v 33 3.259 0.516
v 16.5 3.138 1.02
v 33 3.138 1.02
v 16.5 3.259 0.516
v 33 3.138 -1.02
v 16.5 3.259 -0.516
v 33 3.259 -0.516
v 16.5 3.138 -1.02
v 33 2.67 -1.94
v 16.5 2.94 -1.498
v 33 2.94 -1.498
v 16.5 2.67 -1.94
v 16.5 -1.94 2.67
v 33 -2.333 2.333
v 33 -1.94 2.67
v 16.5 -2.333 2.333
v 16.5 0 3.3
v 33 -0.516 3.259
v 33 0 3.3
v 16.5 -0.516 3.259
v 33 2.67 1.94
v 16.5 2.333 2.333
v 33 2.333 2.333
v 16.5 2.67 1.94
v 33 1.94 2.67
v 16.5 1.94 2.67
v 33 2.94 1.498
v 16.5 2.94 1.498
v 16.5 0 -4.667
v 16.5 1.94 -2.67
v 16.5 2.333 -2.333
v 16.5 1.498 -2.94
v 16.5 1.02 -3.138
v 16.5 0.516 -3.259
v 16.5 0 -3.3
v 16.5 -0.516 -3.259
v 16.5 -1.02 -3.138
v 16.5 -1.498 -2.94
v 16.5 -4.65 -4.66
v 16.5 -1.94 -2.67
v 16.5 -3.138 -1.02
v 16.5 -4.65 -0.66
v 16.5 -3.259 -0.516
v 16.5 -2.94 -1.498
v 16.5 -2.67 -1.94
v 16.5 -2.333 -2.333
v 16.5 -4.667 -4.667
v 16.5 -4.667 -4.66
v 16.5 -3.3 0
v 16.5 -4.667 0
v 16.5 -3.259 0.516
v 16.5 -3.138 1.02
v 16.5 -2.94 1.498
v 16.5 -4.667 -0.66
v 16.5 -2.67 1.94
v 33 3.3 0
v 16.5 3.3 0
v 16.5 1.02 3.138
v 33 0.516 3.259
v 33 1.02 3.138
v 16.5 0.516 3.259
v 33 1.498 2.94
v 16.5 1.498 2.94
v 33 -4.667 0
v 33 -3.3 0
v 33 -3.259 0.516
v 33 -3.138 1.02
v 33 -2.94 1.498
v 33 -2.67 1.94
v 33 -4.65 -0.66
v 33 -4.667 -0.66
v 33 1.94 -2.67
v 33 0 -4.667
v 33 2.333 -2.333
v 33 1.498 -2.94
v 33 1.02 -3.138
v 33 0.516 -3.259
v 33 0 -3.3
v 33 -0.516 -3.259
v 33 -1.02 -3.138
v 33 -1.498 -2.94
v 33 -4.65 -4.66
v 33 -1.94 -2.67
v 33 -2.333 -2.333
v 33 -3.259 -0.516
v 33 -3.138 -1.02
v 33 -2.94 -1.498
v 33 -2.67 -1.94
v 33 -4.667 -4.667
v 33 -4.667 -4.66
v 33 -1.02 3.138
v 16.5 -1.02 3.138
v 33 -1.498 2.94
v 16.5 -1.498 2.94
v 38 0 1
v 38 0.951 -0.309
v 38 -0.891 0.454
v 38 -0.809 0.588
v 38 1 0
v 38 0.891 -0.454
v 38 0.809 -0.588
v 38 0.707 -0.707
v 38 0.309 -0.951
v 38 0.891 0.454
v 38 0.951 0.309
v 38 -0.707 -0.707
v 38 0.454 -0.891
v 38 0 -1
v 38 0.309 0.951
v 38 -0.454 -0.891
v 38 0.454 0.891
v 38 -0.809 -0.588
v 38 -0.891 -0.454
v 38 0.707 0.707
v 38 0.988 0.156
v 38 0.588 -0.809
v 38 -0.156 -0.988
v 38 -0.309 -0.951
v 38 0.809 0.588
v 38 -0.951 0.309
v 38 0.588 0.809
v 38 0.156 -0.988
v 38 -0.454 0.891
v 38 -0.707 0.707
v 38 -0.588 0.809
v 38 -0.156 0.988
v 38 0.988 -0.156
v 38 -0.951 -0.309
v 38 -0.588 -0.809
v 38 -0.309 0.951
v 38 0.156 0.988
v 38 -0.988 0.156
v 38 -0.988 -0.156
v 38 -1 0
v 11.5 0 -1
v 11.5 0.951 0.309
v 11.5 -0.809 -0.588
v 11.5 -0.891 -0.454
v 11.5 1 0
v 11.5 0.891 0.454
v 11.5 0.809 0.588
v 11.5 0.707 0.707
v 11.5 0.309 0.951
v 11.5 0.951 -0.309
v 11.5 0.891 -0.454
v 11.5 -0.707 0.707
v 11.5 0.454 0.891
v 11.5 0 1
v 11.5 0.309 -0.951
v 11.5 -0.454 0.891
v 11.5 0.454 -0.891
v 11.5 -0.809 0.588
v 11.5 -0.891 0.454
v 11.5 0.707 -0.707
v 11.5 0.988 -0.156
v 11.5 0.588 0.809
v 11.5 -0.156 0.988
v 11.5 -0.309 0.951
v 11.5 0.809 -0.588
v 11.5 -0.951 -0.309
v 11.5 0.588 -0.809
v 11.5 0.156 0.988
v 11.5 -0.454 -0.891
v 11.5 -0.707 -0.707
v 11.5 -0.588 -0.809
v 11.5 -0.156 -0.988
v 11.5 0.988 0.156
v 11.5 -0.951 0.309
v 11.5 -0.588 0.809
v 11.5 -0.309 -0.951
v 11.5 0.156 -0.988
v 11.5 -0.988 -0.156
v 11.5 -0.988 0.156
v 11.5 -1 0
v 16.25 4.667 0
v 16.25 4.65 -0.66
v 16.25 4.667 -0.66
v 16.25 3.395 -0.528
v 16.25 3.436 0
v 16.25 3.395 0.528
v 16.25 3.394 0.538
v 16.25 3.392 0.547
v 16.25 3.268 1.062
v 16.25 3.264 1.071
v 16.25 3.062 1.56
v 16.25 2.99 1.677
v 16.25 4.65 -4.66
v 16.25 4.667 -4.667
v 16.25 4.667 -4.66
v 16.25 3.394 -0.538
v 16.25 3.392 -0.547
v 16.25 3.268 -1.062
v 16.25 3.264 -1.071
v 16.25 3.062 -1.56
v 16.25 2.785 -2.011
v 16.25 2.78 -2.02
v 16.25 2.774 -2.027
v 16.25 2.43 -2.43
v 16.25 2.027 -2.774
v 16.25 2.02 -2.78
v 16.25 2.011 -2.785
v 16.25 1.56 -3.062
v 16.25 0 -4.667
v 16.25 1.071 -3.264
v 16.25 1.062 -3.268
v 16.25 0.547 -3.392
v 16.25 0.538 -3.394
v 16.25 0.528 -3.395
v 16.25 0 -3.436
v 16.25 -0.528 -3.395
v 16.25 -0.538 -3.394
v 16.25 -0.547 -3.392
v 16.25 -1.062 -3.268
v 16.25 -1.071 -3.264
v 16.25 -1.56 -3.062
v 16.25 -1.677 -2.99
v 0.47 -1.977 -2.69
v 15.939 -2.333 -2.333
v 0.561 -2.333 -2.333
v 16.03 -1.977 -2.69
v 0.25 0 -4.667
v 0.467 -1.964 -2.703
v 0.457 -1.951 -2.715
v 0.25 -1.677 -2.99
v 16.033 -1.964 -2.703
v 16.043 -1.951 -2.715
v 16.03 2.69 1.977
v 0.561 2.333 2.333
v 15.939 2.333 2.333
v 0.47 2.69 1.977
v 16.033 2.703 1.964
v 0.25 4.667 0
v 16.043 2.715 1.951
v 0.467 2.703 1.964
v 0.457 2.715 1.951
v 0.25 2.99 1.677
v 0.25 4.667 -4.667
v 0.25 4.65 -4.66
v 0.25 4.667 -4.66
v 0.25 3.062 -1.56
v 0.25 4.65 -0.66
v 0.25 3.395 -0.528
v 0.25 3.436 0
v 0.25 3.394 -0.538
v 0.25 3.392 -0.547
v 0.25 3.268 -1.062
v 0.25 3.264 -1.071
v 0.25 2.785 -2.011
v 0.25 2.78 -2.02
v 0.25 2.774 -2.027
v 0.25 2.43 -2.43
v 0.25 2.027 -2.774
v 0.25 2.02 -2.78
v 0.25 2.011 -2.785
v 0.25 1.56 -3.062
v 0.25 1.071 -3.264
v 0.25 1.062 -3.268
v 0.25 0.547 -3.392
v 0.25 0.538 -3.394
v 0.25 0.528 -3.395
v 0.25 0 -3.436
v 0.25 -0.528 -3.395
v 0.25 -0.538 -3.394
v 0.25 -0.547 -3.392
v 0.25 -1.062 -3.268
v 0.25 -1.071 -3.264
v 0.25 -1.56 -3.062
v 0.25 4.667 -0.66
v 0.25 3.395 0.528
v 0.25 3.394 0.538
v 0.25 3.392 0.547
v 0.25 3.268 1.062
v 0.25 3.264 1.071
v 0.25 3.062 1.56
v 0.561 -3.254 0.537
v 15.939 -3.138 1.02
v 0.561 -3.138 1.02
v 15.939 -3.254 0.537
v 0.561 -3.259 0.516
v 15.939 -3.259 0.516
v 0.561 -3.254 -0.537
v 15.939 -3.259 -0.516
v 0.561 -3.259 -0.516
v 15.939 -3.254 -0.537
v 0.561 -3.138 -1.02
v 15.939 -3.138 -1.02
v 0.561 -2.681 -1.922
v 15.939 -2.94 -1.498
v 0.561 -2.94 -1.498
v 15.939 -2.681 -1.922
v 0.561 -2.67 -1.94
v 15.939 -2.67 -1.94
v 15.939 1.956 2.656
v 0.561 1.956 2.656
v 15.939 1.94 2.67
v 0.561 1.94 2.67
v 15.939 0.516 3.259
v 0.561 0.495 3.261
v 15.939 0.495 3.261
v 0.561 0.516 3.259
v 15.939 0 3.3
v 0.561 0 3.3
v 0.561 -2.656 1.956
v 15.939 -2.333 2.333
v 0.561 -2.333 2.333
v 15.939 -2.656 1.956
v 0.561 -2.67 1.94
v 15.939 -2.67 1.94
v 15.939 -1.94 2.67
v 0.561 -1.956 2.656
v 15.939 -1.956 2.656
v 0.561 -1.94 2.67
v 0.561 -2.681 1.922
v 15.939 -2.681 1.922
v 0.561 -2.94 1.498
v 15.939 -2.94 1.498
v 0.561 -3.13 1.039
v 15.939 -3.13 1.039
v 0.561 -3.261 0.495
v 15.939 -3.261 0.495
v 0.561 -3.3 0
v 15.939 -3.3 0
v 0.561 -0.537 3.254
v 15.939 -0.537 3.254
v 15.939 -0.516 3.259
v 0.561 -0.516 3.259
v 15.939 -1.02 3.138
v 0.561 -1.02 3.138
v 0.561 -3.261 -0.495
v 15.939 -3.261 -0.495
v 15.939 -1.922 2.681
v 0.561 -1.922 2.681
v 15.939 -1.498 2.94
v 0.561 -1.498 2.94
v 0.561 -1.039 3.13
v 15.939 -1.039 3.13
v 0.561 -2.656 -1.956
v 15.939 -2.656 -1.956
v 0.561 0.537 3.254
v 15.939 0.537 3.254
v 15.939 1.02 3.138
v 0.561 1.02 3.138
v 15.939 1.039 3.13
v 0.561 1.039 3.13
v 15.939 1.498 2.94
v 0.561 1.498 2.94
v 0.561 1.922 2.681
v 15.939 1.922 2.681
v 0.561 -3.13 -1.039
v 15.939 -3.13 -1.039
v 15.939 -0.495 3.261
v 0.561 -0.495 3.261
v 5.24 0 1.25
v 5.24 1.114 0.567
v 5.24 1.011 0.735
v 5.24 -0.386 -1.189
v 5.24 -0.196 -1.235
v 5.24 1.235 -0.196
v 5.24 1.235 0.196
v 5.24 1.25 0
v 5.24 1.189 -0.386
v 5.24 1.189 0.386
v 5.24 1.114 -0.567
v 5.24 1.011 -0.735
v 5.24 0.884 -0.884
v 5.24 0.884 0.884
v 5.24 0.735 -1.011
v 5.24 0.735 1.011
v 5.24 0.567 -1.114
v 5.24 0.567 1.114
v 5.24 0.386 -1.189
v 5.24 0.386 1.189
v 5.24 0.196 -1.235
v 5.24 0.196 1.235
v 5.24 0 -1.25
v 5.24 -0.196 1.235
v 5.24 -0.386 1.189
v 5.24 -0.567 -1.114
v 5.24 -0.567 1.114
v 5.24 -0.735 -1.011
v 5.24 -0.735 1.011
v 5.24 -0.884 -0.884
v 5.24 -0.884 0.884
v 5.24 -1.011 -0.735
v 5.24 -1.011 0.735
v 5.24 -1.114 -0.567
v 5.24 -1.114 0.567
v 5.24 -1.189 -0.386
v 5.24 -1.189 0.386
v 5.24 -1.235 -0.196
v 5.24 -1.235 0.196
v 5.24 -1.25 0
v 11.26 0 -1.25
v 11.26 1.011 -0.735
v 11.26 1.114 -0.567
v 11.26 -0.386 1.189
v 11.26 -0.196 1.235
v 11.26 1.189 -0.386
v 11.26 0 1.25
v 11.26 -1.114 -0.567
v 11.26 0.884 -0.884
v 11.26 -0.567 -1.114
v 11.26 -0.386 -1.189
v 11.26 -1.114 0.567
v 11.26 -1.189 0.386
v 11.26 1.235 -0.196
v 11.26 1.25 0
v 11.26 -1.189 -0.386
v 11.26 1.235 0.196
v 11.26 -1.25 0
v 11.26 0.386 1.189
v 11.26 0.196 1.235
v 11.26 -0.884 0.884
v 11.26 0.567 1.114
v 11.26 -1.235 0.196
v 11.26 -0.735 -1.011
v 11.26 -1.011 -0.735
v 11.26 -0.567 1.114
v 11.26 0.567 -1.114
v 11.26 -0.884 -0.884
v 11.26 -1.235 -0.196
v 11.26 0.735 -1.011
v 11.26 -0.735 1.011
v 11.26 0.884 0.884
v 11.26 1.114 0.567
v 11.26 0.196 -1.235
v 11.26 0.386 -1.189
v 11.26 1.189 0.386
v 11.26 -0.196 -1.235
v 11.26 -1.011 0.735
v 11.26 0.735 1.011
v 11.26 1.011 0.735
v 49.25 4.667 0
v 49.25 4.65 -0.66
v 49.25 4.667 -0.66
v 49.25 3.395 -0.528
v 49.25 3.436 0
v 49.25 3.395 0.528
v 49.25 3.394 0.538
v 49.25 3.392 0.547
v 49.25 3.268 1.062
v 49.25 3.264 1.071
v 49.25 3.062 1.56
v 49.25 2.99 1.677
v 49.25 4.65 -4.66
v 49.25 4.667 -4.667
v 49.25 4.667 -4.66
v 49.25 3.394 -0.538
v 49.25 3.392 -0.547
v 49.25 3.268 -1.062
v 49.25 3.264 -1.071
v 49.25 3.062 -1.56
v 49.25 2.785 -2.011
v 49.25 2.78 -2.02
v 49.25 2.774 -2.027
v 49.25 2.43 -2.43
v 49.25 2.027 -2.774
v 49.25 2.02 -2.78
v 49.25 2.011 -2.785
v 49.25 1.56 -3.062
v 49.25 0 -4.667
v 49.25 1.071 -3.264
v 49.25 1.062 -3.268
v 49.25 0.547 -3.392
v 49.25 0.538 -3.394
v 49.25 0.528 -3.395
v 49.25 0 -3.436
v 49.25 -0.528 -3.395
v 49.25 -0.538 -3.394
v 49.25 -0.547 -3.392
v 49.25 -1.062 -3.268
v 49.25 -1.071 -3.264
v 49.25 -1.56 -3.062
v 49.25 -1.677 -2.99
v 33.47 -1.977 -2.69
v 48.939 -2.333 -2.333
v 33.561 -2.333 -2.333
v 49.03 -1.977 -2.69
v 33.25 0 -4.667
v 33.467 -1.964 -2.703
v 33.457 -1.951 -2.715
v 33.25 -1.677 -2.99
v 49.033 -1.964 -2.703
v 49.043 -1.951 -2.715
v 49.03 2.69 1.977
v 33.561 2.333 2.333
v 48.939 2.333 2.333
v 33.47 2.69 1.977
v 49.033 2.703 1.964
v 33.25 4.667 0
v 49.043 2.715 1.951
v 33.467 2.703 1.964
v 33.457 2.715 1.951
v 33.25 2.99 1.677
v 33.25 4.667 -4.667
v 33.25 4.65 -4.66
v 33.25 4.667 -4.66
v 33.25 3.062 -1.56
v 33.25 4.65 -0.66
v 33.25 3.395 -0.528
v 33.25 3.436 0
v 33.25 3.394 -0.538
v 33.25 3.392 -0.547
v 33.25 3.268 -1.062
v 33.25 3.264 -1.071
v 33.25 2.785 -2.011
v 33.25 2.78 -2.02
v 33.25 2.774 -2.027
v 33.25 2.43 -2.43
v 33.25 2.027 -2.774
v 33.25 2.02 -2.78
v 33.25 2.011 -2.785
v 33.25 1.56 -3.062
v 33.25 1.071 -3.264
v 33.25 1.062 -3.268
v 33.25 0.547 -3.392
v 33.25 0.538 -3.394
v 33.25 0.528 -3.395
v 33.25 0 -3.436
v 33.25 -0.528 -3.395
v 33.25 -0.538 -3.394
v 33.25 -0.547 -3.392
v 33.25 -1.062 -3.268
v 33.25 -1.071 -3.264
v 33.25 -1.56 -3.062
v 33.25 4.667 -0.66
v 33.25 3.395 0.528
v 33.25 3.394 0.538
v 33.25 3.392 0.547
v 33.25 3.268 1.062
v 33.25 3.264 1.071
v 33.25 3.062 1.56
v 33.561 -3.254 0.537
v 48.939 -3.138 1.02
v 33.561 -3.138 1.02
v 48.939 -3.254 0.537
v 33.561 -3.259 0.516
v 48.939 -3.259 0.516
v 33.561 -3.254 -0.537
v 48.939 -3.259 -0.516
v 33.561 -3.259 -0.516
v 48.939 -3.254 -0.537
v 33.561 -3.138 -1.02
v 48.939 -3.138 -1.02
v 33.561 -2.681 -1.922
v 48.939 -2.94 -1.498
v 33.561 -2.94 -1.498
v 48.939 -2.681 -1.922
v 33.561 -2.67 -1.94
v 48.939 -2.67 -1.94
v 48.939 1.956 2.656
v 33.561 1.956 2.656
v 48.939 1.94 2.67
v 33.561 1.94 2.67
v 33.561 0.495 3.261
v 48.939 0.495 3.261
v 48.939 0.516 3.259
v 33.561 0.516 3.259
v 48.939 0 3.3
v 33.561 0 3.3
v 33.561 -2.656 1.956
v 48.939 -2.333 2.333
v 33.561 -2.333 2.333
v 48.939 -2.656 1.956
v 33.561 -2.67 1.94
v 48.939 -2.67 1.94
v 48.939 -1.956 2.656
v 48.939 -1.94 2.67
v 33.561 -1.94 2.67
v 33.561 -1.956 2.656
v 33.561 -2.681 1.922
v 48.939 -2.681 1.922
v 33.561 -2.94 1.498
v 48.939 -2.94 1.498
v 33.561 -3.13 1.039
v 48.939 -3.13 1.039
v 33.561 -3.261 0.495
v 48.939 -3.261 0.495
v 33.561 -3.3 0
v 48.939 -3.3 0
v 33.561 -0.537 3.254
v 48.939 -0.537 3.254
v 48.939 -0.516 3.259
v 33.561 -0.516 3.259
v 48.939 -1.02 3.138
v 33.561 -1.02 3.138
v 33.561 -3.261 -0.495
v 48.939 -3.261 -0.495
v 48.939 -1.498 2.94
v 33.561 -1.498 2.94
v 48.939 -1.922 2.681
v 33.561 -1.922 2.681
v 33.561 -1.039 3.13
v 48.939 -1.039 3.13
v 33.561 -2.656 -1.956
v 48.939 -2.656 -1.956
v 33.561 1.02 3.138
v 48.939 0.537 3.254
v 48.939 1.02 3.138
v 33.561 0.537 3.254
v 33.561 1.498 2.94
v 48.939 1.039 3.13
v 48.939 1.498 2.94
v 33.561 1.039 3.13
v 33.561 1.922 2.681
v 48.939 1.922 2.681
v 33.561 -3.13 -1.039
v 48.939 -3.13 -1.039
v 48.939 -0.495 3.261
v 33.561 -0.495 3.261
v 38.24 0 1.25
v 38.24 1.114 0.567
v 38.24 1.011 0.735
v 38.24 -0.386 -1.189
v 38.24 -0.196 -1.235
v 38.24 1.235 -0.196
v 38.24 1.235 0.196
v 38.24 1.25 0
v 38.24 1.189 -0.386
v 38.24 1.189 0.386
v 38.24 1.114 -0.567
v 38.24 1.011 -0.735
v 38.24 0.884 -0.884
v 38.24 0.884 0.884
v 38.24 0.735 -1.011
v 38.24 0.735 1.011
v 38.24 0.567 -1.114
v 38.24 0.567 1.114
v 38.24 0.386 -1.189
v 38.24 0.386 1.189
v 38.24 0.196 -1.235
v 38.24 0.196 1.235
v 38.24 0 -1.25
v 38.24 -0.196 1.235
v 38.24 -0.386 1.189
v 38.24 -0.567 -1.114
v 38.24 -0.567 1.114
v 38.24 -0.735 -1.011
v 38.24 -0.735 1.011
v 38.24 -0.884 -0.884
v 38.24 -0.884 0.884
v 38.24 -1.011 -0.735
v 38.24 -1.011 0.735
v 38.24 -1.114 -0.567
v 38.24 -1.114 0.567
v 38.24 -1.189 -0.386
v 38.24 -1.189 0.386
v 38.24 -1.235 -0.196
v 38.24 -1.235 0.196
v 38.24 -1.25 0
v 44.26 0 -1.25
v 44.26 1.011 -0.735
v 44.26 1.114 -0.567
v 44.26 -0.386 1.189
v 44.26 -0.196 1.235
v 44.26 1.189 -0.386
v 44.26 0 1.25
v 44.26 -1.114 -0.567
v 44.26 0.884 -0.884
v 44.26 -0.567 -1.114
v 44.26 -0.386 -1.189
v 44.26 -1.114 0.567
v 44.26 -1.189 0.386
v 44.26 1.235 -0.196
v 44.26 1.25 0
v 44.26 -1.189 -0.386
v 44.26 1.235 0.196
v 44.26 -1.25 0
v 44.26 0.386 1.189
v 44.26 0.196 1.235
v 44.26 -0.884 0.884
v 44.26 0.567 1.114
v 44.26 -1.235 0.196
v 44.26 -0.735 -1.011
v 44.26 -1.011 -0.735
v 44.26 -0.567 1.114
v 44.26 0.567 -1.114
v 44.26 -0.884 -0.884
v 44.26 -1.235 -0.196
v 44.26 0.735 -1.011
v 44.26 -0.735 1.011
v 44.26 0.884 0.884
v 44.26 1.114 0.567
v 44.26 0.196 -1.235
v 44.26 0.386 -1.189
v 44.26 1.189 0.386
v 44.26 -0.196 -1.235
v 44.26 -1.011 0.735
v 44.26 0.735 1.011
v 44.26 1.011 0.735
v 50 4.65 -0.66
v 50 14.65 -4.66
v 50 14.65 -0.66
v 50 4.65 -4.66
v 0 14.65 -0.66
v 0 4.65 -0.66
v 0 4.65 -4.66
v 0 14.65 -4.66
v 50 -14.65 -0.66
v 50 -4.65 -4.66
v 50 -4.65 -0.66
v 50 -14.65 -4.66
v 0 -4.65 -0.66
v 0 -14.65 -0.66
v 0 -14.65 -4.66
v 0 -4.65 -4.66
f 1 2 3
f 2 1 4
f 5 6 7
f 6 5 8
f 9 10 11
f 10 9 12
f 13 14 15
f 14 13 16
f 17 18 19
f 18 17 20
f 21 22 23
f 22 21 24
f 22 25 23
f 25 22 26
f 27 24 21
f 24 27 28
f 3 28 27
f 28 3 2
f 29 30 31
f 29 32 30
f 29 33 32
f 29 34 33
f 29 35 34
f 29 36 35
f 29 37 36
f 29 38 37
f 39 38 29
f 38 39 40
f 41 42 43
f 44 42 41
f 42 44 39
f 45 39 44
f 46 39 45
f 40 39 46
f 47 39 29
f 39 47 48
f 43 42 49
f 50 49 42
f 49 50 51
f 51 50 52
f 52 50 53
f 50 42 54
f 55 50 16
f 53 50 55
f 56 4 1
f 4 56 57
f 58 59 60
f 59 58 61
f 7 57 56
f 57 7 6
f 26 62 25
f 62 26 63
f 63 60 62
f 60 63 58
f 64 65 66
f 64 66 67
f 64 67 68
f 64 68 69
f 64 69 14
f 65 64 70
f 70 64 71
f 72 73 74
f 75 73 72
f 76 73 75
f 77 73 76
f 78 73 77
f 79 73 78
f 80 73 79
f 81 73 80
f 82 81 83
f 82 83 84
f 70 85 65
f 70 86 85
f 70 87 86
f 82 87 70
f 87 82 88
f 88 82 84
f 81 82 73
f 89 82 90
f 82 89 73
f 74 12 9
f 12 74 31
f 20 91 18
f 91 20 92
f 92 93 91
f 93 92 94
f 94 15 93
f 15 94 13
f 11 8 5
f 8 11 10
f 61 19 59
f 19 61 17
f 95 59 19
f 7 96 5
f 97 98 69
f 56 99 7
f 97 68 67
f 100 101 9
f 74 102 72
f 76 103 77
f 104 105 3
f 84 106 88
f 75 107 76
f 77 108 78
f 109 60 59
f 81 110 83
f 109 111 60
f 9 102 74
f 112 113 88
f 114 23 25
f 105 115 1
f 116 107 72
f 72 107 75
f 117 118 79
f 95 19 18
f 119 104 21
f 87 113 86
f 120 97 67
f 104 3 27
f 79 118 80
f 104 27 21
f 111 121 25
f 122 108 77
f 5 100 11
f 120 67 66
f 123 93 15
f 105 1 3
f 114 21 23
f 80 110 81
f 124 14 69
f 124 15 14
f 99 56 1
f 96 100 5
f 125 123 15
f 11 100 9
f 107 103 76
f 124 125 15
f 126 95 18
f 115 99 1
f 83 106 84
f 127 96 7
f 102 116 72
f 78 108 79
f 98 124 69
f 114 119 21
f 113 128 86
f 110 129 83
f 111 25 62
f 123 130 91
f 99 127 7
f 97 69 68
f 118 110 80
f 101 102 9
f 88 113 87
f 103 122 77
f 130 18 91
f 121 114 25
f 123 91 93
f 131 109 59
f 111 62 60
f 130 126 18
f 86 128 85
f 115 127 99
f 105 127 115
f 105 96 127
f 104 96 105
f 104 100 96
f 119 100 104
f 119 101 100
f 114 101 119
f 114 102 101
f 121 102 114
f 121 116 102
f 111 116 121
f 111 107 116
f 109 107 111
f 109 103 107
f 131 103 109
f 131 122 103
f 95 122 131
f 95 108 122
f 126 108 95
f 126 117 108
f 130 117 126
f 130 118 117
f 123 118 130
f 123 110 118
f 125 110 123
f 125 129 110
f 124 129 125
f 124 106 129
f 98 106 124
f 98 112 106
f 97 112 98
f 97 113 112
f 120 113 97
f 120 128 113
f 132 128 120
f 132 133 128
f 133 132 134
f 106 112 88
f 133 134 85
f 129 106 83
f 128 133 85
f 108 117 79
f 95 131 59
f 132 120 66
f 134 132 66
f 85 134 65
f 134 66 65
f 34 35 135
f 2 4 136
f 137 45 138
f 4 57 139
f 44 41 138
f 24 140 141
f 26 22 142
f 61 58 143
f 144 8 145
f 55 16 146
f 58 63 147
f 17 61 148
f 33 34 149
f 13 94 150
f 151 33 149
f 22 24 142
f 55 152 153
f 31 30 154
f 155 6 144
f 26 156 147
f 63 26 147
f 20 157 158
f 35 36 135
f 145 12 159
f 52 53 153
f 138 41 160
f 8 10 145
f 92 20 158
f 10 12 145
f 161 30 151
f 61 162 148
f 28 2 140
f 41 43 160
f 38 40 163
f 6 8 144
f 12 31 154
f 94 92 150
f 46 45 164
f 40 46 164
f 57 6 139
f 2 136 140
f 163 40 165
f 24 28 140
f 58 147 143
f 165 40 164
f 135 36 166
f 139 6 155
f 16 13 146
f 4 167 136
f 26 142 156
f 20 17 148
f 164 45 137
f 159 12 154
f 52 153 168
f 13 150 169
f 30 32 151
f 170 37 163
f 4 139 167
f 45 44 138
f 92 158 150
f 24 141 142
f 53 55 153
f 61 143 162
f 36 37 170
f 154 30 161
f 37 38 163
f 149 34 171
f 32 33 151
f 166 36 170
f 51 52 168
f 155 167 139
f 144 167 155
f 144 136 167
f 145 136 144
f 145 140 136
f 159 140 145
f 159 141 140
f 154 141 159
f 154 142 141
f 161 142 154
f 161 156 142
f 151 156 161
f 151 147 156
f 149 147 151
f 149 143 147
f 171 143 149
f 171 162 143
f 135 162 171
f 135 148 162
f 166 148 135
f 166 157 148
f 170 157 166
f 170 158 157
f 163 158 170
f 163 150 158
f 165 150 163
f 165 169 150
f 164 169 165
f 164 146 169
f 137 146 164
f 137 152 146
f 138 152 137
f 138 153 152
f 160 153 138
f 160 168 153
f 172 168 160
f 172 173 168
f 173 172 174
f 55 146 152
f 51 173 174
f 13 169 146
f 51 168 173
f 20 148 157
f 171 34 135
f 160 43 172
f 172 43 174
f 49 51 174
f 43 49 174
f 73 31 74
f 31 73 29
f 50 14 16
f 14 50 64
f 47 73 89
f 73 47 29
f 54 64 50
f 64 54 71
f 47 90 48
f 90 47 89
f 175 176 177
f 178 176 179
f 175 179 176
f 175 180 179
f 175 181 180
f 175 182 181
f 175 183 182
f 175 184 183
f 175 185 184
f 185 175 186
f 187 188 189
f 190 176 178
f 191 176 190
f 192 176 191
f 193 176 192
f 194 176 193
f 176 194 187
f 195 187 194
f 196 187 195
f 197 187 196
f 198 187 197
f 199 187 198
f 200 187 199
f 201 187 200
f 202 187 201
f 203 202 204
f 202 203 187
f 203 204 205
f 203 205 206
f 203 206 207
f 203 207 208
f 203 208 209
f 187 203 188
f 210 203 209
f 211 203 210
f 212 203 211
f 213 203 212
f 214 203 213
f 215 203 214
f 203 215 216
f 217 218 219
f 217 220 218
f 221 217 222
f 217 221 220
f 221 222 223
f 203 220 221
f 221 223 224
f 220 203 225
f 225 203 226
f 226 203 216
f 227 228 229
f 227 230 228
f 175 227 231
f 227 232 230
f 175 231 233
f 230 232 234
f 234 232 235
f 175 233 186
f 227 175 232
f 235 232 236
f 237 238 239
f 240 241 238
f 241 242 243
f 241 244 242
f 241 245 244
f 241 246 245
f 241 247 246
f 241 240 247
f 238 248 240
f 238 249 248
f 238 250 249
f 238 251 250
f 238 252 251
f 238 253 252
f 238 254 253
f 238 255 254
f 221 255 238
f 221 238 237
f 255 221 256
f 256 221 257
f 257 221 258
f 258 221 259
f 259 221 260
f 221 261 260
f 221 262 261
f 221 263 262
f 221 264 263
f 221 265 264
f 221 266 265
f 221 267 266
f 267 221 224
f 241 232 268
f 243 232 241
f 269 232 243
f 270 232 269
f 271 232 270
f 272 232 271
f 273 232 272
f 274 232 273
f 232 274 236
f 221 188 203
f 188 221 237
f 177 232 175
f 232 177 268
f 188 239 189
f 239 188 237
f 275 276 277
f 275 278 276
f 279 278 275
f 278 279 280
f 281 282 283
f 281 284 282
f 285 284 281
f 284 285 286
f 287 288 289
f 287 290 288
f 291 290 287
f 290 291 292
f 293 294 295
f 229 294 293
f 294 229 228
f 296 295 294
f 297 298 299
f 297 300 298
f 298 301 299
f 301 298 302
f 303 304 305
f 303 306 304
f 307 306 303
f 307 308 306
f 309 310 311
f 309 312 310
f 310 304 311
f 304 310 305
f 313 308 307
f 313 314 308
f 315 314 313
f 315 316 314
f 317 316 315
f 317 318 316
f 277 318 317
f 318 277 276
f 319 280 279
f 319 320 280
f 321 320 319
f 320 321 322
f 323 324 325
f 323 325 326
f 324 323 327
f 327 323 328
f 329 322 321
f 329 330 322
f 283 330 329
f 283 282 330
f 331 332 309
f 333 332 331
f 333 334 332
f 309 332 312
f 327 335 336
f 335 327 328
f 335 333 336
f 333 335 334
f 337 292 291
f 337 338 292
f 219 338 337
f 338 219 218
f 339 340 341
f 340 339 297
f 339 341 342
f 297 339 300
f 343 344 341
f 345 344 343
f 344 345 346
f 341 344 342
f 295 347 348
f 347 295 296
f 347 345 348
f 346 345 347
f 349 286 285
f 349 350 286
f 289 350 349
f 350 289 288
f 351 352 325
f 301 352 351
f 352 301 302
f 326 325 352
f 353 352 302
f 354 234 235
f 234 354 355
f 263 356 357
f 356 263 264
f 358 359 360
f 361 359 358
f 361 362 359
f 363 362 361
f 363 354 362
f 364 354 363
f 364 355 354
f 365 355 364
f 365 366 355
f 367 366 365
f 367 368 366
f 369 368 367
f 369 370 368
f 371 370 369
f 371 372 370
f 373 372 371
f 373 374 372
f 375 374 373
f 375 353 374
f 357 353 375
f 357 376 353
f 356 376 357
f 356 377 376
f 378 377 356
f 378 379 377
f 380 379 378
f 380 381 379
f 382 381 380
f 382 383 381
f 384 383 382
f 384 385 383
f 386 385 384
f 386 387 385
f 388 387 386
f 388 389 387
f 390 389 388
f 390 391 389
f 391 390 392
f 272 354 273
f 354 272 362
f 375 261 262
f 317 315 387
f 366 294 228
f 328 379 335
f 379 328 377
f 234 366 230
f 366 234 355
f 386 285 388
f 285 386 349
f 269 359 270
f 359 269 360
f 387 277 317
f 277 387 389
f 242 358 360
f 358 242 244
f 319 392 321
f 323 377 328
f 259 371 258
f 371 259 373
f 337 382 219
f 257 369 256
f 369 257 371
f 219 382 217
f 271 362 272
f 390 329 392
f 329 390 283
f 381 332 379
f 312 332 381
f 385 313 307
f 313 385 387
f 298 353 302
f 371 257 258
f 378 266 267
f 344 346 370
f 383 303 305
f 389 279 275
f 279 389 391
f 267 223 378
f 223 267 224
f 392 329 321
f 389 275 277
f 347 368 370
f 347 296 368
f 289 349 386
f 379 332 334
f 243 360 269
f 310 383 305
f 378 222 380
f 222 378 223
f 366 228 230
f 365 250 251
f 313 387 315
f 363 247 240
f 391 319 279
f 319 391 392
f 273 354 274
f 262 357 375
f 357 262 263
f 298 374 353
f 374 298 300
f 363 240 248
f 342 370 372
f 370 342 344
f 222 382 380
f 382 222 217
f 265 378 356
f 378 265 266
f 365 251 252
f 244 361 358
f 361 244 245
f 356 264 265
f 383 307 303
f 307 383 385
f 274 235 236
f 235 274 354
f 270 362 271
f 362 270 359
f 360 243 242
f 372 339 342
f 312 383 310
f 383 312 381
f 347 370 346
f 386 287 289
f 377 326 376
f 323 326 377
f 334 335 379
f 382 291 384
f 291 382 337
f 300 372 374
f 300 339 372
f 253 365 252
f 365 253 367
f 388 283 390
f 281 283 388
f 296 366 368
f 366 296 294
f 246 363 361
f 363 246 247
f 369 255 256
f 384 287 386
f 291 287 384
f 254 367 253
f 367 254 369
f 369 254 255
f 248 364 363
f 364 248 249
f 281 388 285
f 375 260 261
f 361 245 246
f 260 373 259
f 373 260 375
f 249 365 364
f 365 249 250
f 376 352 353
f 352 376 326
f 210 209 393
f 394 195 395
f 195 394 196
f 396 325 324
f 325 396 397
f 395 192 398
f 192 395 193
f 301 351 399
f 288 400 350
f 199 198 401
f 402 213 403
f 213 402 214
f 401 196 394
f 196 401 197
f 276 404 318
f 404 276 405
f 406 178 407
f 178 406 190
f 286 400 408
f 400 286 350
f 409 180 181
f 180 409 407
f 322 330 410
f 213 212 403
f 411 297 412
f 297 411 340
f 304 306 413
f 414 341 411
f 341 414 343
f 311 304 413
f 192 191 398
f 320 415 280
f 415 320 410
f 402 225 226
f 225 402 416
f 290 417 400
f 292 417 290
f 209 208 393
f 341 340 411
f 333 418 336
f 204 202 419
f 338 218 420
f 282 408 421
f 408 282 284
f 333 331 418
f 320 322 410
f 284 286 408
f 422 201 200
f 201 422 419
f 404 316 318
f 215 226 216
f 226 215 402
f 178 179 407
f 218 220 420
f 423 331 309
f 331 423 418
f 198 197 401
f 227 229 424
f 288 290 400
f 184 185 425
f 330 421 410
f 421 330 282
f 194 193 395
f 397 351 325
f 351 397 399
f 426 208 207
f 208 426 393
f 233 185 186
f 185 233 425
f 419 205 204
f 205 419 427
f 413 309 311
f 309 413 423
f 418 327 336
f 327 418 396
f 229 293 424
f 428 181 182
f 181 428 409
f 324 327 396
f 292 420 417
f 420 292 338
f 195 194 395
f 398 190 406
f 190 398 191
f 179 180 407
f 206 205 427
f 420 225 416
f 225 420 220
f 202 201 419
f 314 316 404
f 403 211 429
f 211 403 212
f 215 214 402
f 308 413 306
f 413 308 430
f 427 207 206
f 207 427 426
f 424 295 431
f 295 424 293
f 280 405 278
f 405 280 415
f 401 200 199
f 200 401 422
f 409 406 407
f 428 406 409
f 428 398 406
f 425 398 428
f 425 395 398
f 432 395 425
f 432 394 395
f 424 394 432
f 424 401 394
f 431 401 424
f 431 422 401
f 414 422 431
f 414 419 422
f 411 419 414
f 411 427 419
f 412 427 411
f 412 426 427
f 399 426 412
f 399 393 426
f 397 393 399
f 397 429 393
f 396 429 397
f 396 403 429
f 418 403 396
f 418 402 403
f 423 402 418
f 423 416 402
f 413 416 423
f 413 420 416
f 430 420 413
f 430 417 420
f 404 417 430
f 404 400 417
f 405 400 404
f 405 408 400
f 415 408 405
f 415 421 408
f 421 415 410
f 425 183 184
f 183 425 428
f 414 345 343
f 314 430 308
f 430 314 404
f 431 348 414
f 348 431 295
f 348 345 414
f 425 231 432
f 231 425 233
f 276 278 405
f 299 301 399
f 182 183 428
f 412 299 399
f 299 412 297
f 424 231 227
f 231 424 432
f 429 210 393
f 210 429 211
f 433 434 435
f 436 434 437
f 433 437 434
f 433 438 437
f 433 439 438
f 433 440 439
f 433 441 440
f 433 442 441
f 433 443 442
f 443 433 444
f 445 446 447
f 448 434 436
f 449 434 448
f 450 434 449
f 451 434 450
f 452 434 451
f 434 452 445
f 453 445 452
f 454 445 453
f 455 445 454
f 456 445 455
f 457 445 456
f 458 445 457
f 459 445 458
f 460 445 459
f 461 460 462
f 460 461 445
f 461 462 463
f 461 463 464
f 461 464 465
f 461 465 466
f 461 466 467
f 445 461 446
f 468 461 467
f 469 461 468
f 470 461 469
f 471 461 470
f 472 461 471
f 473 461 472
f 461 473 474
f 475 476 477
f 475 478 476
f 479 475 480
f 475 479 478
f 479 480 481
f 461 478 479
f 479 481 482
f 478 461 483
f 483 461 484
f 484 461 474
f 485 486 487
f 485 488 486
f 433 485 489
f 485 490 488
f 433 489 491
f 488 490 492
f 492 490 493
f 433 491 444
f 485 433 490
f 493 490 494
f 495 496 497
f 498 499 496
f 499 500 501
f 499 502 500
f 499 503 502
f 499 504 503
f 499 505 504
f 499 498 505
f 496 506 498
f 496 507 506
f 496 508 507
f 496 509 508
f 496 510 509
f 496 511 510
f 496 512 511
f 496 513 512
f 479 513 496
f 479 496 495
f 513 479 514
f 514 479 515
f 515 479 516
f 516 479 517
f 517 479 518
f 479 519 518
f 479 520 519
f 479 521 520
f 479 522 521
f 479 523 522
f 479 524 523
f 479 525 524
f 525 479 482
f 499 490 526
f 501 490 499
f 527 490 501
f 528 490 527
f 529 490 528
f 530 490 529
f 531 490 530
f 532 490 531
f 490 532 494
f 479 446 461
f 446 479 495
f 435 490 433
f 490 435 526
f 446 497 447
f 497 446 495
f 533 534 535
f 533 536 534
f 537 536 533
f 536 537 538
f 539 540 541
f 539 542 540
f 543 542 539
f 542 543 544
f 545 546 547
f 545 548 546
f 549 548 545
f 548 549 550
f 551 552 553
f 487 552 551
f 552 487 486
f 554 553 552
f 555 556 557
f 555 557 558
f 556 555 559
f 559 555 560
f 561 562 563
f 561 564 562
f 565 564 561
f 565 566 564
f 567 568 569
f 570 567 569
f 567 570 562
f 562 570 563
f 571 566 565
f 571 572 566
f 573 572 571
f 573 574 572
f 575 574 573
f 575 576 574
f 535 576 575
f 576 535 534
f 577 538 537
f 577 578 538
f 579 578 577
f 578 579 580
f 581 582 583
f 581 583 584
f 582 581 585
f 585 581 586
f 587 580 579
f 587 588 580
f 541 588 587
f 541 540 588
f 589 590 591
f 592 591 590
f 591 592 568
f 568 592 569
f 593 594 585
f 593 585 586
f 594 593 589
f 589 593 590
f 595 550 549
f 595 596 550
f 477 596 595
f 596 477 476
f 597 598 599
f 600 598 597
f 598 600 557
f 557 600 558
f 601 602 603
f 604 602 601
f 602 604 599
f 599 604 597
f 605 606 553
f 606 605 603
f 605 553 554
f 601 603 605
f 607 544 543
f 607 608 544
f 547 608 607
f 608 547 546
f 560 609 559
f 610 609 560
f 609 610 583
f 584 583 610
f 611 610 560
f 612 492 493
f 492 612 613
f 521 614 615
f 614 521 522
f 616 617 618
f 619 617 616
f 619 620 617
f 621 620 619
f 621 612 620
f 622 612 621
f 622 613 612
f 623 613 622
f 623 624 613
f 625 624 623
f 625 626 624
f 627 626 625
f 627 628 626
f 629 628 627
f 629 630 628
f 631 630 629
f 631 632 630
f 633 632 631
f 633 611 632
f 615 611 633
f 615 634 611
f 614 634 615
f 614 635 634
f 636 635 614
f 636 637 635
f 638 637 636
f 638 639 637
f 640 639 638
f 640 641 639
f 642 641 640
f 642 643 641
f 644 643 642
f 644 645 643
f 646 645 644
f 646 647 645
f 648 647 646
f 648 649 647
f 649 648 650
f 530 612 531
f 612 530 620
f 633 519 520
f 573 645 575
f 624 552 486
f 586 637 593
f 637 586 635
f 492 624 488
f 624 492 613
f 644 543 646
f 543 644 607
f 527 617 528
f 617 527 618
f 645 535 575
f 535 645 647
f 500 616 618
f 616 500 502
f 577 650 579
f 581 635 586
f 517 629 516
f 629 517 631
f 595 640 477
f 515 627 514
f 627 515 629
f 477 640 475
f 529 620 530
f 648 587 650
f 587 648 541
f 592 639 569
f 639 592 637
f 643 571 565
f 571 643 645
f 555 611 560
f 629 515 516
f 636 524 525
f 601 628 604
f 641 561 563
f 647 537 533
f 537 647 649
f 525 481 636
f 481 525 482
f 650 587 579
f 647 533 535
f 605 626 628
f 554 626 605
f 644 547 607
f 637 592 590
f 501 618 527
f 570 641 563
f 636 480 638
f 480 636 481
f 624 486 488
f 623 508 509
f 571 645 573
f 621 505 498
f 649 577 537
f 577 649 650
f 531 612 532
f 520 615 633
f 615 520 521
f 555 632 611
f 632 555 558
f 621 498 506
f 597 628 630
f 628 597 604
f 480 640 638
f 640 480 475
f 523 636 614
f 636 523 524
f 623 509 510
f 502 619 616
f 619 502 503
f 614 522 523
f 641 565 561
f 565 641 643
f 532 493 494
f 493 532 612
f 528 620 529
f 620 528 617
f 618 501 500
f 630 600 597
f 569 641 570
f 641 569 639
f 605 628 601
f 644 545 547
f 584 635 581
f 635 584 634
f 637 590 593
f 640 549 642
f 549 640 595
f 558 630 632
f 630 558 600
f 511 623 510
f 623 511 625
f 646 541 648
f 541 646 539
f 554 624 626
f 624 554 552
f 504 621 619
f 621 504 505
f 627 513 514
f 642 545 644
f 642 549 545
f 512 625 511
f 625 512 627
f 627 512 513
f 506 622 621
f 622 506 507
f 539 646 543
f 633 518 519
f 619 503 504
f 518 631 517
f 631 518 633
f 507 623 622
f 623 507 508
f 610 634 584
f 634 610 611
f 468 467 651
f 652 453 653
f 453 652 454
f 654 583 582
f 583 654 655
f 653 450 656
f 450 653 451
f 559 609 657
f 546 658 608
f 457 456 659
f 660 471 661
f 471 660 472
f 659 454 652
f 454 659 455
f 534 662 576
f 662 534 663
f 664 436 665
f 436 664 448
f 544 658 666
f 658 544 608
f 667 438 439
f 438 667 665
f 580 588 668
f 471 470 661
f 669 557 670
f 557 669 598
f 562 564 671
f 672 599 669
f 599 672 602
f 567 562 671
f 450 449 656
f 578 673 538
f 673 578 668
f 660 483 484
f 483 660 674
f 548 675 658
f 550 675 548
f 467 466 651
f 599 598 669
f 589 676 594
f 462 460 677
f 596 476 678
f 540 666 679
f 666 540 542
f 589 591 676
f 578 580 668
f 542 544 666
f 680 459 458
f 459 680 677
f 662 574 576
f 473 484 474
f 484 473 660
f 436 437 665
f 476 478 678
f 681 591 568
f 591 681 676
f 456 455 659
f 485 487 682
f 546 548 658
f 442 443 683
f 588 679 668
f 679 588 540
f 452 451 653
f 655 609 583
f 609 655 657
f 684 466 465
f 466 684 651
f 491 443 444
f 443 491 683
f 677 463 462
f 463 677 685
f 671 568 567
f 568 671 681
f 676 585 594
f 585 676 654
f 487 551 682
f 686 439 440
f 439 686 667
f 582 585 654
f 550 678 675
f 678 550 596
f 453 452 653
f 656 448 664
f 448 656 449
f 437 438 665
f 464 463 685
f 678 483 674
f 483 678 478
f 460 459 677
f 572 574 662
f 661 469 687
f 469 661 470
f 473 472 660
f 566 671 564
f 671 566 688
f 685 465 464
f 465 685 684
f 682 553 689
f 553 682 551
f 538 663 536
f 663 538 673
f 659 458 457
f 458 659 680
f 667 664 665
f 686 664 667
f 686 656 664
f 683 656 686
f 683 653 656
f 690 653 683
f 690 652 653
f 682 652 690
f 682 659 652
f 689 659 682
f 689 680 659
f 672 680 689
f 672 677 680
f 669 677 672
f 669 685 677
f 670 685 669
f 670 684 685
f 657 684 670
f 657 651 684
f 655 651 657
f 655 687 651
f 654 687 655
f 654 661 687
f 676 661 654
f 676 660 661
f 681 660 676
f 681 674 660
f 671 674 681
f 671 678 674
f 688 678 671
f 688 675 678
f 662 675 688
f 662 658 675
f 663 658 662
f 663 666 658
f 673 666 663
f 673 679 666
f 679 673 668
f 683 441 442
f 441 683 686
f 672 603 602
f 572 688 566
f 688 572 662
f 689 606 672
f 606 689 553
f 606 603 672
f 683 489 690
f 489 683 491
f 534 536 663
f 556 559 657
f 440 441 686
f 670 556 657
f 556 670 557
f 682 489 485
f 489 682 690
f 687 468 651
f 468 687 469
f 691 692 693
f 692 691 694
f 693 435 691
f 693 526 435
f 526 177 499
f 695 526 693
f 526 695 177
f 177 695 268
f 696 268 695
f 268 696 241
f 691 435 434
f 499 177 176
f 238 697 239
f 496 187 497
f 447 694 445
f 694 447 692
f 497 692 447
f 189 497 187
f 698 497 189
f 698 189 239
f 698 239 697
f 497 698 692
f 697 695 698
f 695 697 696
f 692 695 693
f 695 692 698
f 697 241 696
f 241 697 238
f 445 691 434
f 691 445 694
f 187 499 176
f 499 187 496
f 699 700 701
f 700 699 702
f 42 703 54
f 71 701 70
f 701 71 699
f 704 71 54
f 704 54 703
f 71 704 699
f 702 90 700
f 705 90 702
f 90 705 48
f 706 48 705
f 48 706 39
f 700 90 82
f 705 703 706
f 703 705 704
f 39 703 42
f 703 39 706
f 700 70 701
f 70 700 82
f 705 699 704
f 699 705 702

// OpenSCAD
// file: roundCornersCube.scad
/*
http://codeviewer.org/view/code:1b36 
Copyright (C) 2011 Sergio Vilches
This program is free software: you can redistribute it and/or modify it under the terms of the GNU General Public License as published by the Free Software Foundation, either version 3 of the License, or (at your option) any later version.
This program is distributed in the hope that it will be useful, but WITHOUT ANY WARRANTY; without even the implied warranty of MERCHANTABILITY or FITNESS FOR A PARTICULAR PURPOSE. See the GNU General Public License for more details. You should have received a copy of the GNU General Public License along with this program. If not, see <http://www.gnu.org/licenses/>.
Contact: s.vilches.e@gmail.com


    ----------------------------------------------------------- 
                 Round Corners Cube (Extruded)                
      roundCornersCube(x,y,z,r) Where:                        
         - x = Xdir width                                     
         - y = Ydir width                                     
         - z = Height of the cube                             
         - r = Rounding radious                               
                                                              
      Example: roundCornerCube(10,10,2,1);                    
     *Some times it's needed to use F6 to see good results!   
 	 ----------------------------------------------------------- 
*/
// Test it!
// roundCornersCube(10,5,2,1);


module createMeniscus(h,radius) // This module creates the shape that needs to be substracted from a cube to make its corners rounded.
difference(){        //This shape is basicly the difference between a quarter of cylinder and a cube
   translate([radius/2+0.1,radius/2+0.1,0]){
      cube([radius+0.2,radius+0.1,h+0.2],center=true);         // All that 0.x numbers are to avoid "ghost boundaries" when substracting
   }

   cylinder(h=h+0.2,r=radius,$fn = 25,center=true);
}


module rCube(x,y,z,r)  // Now we just substract the shape we have created in the four corners
difference(){
   cube([x,y,z], center=true);

translate([x/2-r,y/2-r]){  // We move to the first corner (x,y)
      rotate(0){  
         createMeniscus(z,r); // And substract the meniscus
      }
   }
   translate([-x/2+r,y/2-r]){ // To the second corner (-x,y)
      rotate(90){
         createMeniscus(z,r); // But this time we have to rotate the meniscus 90 deg
      }
   }
      translate([-x/2+r,-y/2+r]){ // ... 
      rotate(180){
         createMeniscus(z,r);
      }
   }
      translate([x/2-r,-y/2+r]){
      rotate(270){
         createMeniscus(z,r);
      }
   }
}

module createSubtractor(h,radius) //Create the shape that needs to be substracted from a cube
difference(){ cube([radius+0.1,radius+0.1,h]); cylinder(h=h,r=radius+0.1,$fn = 25); } //+0.1 stops ghost edges

module rCube(x,y,z,r)//Create a cube and subtract the 4 corners
difference(){
cube([x,y,z]);
translate([x-r,y-r]) rotate(0) createSubtractor(z,r); 
translate([r,y-r]) rotate(90) createSubtractor(z,r);
translate([r,r]) rotate(180) createSubtractor(z,r);
translate([x-r,r]) rotate(270) createSubtractor(z,r);
}
// file: wallet.scad
include <roundCornersCube.scad>

//credit card width
cw = 53.98;

ch = 85.6;

w = 5;

module credit_card()
{
rCube(cw,ch,1.5,5);


}

module wallet()
{
rCube(cw+w*2, ch+w*2, 8, 6);


}


translate([0,0,20])
credit_card();

minkowski()
{
sphere(r=3);
wallet();
}
// main file
$fn = 40;
use <wallet.scad>

//credit_card();

//hinge give
hg = .25;

//give between hinge and wallet
give = -.2;

//distance between cylinders in hinge

dc = 8.5+1-3;

//hinge radius1
hr1 = 3.3;

hr2 = 1;

//cylinder height
ch = 5;

//total hinge distance
th = dc+ch*2;


//distance between hinges
dh = th;

//bottom walls' thickness
bw = 2;

//magnet hole radius
mhr = 5.6;

//magnet hole height
mhh = 4.4+1;


module hinge_m(left=true, right=true)
{
r1 = hr1;
r2 = hr2;


rotate([0,90,0])
cylinder(r=hr1, h=th);


//cones
if(left){
rotate([0,-90,0])
cylinder(r1=r1, r2=r2, h=ch);
}

if(right){
translate([ch*2+dc,0,0])
rotate([0,90,0])
cylinder(r1=r1, r2=r2, h=ch);
}


rotate([135,0,0])
translate([0,-hr1,0])
cube([th,hr1*2,hr1]);


//support box
translate([0,-hr1*sqrt(2),-hr1*sqrt(2)])
cube([th,hr1*sqrt(2),hr1*sqrt(2)]);

//give box
translate([0,-give-hr1*sqrt(2),-hr1*sqrt(2)])
cube([th,give,hr1*sqrt(2)]);


}




module hinge_f()
{

difference()
{
union()
{





//translate([0,0,hr1])
//support();

rotate([135,0,0])
translate([-th+hg,-hr1,0])
cube([th-hg*2,hr1*2,hr1]);


//support box
translate([-th+hg,-hr1*sqrt(2),-hr1*sqrt(2)])
cube([th-hg*2,hr1*sqrt(2),hr1*sqrt(2)]);

//give box
translate([-th+hg,-give-hr1*sqrt(2),-hr1*sqrt(2)])
cube([th-hg*2,give,hr1*sqrt(2)]);



translate([-th,0,0])
rotate([0,90,0])
cylinder(r=hr1,h=th);
}

translate([.01,0,0])
rotate([0,-90,0])
cylinder(r1=hr1+hg, r2=hr2+hg,h=ch+hg);


translate([-th-.01,0,0])
rotate([0,90,0])
cylinder(r1=hr1+hg, r2=hr2+hg,h=ch+hg);
}
}



//space for money, cards and junk
module bottom()
{
//sliders!


translate([12-5,16,2.01])

rotate([90,0,180])
linear_extrude(height=4)
polygon(points=[[5.01,3.18], [5.01,0], [0,0]]);


//roof!
translate([70.5+5,0,hr1*sqrt(2)-.75+.5])
cube([20,58,.75]);


translate([12-5,40,2.01])

rotate([90,0,180])
linear_extrude(height=4)
polygon(points=[[5,3.18], [5,0], [0,0]]);




difference()
{
union()
{

rCube(th*5,60,hr1*sqrt(2)+.5,4);

translate([0,0,0])
cube([th*5,4,hr1*sqrt(2)]);



//magnet holder 2
translate([th*2.5,63.7,4.7])
cylinder(r=5.69, h=.85);

difference()
{

translate([th*2.5,63,0])
cylinder(r=8, h=hr1*sqrt(2)+.5);


//translate([th*2.5,63.7,1.5])
//cylinder(r=mhr, h=mhh);
}

}


translate([th*2.5,63.7,1.5])
cylinder(r=mhr, h=mhh-1.4);

translate([2,2,2])
rCube(th*5-4,60-4,hr1*2,4);
}


/*
//magnet holder
translate([2,58,0])
quarter_cylinder(r=15, h=10);

translate([6,54,0])
cylinder(r=5, h=20);
*/
}




//space for cards
module top()
{
difference()
{
union()
{
rCube(th*5,60,hr1*sqrt(2)-.5,4);

//magnet holder 2

translate([th*2.5,63.7,4.7-1])
cylinder(r=5.69, h=.85);


difference()
{
translate([th*2.5,63,0])
cylinder(r=8, h=hr1*sqrt(2)-.5);

translate([th*2.5,63.7,1.5])
cylinder(r=mhr, h=mhh);
}
}

//credit card slots!

/*
translate([95,2.5,1])
rotate([0,0,90])

scale([1.00235,1.1,1.25])
credit_card();
*/

translate([86,2.5,1.25])
rotate([0,0,90])

scale([1.00235,1.1,1.24])
credit_card();


//finger hole

translate([50,30,-.1])
scale([2.5,1,1])
cylinder(r=12, h=2);



}
}

//TEST FIT!
/*
rotate([0,0,90])
translate([7,-80,-5])
credit_card();
*/


module quarter_cylinder(r=1, h=1)
{
difference()
{
cylinder(r=r, h=h);
translate([-r,0,0])
cube([r*2,r,r]);

translate([-r,-r,0])
cube([r,r*2,r]);

}
}


/*
//FULHACK ALERT
translate([0,give,hr1])
rotate([45,0,0])
translate([-th-dh,0,0])
{
rotate([0,90,0])
cylinder(r=hr1, h=dh);



translate([0,-hr1-hr1*.414*2,-hr1])
cube([th, hr1+.414*2*hr1, hr1*2]);


support();
}





translate([0,give,hr1])
rotate([45,0,0])

for(i=[0:1])
{
hinge_m();
translate([i*(th+dh),0,0])
rotate([0,90,0])
cylinder(r=hr1, h=dh);
translate([i*(ch*2+dc+dh),0,0])
hinge_m();

}

//cube([2,20,1]);

*/


/*
translate([-th*2+2,-hr1-give-3,10])
rotate([0,0,-90])
credit_card();
*/

/*
translate([0,give,hr1])
rotate([-45,0,0])
translate([0,0,-hr1])

{
for(i=[0:1])
{
translate([i*th*2,0,0])
hinge_f();

}
 

}


translate([-th*2,-hr1-give,-hr1])
mirror([0,1,0])
bottom();


translate([-th*2,hr1+give+give+give,-hr1])
top();
*/


/*
rotate([45,0,0])
hinge_m();

rotate([-45,0,0])
translate([0,0,-hr1])
hinge_f();
*/


/*
translate([0,0,50])
hinge_m();
*/



mirror([1,0,0])
{
//HINGES!!!

translate([-th*2,0,0])
hinge_m();




mirror([0,1,0])
{
hinge_f();
translate([-th*2,0,0])
hinge_f();
}
/*
translate([-th*4,-hr1*sqrt(2)-give,-hr1*sqrt(2)])
mirror([0,1,0])
bottom();



translate([-th*4,hr1*sqrt(2)+give,-hr1*sqrt(2)])
top();
*/
}


translate([0,4.65,-4.66])
cube([50,10,4]);


translate([0,-14.65,-4.66])
cube([50,10,4]);
